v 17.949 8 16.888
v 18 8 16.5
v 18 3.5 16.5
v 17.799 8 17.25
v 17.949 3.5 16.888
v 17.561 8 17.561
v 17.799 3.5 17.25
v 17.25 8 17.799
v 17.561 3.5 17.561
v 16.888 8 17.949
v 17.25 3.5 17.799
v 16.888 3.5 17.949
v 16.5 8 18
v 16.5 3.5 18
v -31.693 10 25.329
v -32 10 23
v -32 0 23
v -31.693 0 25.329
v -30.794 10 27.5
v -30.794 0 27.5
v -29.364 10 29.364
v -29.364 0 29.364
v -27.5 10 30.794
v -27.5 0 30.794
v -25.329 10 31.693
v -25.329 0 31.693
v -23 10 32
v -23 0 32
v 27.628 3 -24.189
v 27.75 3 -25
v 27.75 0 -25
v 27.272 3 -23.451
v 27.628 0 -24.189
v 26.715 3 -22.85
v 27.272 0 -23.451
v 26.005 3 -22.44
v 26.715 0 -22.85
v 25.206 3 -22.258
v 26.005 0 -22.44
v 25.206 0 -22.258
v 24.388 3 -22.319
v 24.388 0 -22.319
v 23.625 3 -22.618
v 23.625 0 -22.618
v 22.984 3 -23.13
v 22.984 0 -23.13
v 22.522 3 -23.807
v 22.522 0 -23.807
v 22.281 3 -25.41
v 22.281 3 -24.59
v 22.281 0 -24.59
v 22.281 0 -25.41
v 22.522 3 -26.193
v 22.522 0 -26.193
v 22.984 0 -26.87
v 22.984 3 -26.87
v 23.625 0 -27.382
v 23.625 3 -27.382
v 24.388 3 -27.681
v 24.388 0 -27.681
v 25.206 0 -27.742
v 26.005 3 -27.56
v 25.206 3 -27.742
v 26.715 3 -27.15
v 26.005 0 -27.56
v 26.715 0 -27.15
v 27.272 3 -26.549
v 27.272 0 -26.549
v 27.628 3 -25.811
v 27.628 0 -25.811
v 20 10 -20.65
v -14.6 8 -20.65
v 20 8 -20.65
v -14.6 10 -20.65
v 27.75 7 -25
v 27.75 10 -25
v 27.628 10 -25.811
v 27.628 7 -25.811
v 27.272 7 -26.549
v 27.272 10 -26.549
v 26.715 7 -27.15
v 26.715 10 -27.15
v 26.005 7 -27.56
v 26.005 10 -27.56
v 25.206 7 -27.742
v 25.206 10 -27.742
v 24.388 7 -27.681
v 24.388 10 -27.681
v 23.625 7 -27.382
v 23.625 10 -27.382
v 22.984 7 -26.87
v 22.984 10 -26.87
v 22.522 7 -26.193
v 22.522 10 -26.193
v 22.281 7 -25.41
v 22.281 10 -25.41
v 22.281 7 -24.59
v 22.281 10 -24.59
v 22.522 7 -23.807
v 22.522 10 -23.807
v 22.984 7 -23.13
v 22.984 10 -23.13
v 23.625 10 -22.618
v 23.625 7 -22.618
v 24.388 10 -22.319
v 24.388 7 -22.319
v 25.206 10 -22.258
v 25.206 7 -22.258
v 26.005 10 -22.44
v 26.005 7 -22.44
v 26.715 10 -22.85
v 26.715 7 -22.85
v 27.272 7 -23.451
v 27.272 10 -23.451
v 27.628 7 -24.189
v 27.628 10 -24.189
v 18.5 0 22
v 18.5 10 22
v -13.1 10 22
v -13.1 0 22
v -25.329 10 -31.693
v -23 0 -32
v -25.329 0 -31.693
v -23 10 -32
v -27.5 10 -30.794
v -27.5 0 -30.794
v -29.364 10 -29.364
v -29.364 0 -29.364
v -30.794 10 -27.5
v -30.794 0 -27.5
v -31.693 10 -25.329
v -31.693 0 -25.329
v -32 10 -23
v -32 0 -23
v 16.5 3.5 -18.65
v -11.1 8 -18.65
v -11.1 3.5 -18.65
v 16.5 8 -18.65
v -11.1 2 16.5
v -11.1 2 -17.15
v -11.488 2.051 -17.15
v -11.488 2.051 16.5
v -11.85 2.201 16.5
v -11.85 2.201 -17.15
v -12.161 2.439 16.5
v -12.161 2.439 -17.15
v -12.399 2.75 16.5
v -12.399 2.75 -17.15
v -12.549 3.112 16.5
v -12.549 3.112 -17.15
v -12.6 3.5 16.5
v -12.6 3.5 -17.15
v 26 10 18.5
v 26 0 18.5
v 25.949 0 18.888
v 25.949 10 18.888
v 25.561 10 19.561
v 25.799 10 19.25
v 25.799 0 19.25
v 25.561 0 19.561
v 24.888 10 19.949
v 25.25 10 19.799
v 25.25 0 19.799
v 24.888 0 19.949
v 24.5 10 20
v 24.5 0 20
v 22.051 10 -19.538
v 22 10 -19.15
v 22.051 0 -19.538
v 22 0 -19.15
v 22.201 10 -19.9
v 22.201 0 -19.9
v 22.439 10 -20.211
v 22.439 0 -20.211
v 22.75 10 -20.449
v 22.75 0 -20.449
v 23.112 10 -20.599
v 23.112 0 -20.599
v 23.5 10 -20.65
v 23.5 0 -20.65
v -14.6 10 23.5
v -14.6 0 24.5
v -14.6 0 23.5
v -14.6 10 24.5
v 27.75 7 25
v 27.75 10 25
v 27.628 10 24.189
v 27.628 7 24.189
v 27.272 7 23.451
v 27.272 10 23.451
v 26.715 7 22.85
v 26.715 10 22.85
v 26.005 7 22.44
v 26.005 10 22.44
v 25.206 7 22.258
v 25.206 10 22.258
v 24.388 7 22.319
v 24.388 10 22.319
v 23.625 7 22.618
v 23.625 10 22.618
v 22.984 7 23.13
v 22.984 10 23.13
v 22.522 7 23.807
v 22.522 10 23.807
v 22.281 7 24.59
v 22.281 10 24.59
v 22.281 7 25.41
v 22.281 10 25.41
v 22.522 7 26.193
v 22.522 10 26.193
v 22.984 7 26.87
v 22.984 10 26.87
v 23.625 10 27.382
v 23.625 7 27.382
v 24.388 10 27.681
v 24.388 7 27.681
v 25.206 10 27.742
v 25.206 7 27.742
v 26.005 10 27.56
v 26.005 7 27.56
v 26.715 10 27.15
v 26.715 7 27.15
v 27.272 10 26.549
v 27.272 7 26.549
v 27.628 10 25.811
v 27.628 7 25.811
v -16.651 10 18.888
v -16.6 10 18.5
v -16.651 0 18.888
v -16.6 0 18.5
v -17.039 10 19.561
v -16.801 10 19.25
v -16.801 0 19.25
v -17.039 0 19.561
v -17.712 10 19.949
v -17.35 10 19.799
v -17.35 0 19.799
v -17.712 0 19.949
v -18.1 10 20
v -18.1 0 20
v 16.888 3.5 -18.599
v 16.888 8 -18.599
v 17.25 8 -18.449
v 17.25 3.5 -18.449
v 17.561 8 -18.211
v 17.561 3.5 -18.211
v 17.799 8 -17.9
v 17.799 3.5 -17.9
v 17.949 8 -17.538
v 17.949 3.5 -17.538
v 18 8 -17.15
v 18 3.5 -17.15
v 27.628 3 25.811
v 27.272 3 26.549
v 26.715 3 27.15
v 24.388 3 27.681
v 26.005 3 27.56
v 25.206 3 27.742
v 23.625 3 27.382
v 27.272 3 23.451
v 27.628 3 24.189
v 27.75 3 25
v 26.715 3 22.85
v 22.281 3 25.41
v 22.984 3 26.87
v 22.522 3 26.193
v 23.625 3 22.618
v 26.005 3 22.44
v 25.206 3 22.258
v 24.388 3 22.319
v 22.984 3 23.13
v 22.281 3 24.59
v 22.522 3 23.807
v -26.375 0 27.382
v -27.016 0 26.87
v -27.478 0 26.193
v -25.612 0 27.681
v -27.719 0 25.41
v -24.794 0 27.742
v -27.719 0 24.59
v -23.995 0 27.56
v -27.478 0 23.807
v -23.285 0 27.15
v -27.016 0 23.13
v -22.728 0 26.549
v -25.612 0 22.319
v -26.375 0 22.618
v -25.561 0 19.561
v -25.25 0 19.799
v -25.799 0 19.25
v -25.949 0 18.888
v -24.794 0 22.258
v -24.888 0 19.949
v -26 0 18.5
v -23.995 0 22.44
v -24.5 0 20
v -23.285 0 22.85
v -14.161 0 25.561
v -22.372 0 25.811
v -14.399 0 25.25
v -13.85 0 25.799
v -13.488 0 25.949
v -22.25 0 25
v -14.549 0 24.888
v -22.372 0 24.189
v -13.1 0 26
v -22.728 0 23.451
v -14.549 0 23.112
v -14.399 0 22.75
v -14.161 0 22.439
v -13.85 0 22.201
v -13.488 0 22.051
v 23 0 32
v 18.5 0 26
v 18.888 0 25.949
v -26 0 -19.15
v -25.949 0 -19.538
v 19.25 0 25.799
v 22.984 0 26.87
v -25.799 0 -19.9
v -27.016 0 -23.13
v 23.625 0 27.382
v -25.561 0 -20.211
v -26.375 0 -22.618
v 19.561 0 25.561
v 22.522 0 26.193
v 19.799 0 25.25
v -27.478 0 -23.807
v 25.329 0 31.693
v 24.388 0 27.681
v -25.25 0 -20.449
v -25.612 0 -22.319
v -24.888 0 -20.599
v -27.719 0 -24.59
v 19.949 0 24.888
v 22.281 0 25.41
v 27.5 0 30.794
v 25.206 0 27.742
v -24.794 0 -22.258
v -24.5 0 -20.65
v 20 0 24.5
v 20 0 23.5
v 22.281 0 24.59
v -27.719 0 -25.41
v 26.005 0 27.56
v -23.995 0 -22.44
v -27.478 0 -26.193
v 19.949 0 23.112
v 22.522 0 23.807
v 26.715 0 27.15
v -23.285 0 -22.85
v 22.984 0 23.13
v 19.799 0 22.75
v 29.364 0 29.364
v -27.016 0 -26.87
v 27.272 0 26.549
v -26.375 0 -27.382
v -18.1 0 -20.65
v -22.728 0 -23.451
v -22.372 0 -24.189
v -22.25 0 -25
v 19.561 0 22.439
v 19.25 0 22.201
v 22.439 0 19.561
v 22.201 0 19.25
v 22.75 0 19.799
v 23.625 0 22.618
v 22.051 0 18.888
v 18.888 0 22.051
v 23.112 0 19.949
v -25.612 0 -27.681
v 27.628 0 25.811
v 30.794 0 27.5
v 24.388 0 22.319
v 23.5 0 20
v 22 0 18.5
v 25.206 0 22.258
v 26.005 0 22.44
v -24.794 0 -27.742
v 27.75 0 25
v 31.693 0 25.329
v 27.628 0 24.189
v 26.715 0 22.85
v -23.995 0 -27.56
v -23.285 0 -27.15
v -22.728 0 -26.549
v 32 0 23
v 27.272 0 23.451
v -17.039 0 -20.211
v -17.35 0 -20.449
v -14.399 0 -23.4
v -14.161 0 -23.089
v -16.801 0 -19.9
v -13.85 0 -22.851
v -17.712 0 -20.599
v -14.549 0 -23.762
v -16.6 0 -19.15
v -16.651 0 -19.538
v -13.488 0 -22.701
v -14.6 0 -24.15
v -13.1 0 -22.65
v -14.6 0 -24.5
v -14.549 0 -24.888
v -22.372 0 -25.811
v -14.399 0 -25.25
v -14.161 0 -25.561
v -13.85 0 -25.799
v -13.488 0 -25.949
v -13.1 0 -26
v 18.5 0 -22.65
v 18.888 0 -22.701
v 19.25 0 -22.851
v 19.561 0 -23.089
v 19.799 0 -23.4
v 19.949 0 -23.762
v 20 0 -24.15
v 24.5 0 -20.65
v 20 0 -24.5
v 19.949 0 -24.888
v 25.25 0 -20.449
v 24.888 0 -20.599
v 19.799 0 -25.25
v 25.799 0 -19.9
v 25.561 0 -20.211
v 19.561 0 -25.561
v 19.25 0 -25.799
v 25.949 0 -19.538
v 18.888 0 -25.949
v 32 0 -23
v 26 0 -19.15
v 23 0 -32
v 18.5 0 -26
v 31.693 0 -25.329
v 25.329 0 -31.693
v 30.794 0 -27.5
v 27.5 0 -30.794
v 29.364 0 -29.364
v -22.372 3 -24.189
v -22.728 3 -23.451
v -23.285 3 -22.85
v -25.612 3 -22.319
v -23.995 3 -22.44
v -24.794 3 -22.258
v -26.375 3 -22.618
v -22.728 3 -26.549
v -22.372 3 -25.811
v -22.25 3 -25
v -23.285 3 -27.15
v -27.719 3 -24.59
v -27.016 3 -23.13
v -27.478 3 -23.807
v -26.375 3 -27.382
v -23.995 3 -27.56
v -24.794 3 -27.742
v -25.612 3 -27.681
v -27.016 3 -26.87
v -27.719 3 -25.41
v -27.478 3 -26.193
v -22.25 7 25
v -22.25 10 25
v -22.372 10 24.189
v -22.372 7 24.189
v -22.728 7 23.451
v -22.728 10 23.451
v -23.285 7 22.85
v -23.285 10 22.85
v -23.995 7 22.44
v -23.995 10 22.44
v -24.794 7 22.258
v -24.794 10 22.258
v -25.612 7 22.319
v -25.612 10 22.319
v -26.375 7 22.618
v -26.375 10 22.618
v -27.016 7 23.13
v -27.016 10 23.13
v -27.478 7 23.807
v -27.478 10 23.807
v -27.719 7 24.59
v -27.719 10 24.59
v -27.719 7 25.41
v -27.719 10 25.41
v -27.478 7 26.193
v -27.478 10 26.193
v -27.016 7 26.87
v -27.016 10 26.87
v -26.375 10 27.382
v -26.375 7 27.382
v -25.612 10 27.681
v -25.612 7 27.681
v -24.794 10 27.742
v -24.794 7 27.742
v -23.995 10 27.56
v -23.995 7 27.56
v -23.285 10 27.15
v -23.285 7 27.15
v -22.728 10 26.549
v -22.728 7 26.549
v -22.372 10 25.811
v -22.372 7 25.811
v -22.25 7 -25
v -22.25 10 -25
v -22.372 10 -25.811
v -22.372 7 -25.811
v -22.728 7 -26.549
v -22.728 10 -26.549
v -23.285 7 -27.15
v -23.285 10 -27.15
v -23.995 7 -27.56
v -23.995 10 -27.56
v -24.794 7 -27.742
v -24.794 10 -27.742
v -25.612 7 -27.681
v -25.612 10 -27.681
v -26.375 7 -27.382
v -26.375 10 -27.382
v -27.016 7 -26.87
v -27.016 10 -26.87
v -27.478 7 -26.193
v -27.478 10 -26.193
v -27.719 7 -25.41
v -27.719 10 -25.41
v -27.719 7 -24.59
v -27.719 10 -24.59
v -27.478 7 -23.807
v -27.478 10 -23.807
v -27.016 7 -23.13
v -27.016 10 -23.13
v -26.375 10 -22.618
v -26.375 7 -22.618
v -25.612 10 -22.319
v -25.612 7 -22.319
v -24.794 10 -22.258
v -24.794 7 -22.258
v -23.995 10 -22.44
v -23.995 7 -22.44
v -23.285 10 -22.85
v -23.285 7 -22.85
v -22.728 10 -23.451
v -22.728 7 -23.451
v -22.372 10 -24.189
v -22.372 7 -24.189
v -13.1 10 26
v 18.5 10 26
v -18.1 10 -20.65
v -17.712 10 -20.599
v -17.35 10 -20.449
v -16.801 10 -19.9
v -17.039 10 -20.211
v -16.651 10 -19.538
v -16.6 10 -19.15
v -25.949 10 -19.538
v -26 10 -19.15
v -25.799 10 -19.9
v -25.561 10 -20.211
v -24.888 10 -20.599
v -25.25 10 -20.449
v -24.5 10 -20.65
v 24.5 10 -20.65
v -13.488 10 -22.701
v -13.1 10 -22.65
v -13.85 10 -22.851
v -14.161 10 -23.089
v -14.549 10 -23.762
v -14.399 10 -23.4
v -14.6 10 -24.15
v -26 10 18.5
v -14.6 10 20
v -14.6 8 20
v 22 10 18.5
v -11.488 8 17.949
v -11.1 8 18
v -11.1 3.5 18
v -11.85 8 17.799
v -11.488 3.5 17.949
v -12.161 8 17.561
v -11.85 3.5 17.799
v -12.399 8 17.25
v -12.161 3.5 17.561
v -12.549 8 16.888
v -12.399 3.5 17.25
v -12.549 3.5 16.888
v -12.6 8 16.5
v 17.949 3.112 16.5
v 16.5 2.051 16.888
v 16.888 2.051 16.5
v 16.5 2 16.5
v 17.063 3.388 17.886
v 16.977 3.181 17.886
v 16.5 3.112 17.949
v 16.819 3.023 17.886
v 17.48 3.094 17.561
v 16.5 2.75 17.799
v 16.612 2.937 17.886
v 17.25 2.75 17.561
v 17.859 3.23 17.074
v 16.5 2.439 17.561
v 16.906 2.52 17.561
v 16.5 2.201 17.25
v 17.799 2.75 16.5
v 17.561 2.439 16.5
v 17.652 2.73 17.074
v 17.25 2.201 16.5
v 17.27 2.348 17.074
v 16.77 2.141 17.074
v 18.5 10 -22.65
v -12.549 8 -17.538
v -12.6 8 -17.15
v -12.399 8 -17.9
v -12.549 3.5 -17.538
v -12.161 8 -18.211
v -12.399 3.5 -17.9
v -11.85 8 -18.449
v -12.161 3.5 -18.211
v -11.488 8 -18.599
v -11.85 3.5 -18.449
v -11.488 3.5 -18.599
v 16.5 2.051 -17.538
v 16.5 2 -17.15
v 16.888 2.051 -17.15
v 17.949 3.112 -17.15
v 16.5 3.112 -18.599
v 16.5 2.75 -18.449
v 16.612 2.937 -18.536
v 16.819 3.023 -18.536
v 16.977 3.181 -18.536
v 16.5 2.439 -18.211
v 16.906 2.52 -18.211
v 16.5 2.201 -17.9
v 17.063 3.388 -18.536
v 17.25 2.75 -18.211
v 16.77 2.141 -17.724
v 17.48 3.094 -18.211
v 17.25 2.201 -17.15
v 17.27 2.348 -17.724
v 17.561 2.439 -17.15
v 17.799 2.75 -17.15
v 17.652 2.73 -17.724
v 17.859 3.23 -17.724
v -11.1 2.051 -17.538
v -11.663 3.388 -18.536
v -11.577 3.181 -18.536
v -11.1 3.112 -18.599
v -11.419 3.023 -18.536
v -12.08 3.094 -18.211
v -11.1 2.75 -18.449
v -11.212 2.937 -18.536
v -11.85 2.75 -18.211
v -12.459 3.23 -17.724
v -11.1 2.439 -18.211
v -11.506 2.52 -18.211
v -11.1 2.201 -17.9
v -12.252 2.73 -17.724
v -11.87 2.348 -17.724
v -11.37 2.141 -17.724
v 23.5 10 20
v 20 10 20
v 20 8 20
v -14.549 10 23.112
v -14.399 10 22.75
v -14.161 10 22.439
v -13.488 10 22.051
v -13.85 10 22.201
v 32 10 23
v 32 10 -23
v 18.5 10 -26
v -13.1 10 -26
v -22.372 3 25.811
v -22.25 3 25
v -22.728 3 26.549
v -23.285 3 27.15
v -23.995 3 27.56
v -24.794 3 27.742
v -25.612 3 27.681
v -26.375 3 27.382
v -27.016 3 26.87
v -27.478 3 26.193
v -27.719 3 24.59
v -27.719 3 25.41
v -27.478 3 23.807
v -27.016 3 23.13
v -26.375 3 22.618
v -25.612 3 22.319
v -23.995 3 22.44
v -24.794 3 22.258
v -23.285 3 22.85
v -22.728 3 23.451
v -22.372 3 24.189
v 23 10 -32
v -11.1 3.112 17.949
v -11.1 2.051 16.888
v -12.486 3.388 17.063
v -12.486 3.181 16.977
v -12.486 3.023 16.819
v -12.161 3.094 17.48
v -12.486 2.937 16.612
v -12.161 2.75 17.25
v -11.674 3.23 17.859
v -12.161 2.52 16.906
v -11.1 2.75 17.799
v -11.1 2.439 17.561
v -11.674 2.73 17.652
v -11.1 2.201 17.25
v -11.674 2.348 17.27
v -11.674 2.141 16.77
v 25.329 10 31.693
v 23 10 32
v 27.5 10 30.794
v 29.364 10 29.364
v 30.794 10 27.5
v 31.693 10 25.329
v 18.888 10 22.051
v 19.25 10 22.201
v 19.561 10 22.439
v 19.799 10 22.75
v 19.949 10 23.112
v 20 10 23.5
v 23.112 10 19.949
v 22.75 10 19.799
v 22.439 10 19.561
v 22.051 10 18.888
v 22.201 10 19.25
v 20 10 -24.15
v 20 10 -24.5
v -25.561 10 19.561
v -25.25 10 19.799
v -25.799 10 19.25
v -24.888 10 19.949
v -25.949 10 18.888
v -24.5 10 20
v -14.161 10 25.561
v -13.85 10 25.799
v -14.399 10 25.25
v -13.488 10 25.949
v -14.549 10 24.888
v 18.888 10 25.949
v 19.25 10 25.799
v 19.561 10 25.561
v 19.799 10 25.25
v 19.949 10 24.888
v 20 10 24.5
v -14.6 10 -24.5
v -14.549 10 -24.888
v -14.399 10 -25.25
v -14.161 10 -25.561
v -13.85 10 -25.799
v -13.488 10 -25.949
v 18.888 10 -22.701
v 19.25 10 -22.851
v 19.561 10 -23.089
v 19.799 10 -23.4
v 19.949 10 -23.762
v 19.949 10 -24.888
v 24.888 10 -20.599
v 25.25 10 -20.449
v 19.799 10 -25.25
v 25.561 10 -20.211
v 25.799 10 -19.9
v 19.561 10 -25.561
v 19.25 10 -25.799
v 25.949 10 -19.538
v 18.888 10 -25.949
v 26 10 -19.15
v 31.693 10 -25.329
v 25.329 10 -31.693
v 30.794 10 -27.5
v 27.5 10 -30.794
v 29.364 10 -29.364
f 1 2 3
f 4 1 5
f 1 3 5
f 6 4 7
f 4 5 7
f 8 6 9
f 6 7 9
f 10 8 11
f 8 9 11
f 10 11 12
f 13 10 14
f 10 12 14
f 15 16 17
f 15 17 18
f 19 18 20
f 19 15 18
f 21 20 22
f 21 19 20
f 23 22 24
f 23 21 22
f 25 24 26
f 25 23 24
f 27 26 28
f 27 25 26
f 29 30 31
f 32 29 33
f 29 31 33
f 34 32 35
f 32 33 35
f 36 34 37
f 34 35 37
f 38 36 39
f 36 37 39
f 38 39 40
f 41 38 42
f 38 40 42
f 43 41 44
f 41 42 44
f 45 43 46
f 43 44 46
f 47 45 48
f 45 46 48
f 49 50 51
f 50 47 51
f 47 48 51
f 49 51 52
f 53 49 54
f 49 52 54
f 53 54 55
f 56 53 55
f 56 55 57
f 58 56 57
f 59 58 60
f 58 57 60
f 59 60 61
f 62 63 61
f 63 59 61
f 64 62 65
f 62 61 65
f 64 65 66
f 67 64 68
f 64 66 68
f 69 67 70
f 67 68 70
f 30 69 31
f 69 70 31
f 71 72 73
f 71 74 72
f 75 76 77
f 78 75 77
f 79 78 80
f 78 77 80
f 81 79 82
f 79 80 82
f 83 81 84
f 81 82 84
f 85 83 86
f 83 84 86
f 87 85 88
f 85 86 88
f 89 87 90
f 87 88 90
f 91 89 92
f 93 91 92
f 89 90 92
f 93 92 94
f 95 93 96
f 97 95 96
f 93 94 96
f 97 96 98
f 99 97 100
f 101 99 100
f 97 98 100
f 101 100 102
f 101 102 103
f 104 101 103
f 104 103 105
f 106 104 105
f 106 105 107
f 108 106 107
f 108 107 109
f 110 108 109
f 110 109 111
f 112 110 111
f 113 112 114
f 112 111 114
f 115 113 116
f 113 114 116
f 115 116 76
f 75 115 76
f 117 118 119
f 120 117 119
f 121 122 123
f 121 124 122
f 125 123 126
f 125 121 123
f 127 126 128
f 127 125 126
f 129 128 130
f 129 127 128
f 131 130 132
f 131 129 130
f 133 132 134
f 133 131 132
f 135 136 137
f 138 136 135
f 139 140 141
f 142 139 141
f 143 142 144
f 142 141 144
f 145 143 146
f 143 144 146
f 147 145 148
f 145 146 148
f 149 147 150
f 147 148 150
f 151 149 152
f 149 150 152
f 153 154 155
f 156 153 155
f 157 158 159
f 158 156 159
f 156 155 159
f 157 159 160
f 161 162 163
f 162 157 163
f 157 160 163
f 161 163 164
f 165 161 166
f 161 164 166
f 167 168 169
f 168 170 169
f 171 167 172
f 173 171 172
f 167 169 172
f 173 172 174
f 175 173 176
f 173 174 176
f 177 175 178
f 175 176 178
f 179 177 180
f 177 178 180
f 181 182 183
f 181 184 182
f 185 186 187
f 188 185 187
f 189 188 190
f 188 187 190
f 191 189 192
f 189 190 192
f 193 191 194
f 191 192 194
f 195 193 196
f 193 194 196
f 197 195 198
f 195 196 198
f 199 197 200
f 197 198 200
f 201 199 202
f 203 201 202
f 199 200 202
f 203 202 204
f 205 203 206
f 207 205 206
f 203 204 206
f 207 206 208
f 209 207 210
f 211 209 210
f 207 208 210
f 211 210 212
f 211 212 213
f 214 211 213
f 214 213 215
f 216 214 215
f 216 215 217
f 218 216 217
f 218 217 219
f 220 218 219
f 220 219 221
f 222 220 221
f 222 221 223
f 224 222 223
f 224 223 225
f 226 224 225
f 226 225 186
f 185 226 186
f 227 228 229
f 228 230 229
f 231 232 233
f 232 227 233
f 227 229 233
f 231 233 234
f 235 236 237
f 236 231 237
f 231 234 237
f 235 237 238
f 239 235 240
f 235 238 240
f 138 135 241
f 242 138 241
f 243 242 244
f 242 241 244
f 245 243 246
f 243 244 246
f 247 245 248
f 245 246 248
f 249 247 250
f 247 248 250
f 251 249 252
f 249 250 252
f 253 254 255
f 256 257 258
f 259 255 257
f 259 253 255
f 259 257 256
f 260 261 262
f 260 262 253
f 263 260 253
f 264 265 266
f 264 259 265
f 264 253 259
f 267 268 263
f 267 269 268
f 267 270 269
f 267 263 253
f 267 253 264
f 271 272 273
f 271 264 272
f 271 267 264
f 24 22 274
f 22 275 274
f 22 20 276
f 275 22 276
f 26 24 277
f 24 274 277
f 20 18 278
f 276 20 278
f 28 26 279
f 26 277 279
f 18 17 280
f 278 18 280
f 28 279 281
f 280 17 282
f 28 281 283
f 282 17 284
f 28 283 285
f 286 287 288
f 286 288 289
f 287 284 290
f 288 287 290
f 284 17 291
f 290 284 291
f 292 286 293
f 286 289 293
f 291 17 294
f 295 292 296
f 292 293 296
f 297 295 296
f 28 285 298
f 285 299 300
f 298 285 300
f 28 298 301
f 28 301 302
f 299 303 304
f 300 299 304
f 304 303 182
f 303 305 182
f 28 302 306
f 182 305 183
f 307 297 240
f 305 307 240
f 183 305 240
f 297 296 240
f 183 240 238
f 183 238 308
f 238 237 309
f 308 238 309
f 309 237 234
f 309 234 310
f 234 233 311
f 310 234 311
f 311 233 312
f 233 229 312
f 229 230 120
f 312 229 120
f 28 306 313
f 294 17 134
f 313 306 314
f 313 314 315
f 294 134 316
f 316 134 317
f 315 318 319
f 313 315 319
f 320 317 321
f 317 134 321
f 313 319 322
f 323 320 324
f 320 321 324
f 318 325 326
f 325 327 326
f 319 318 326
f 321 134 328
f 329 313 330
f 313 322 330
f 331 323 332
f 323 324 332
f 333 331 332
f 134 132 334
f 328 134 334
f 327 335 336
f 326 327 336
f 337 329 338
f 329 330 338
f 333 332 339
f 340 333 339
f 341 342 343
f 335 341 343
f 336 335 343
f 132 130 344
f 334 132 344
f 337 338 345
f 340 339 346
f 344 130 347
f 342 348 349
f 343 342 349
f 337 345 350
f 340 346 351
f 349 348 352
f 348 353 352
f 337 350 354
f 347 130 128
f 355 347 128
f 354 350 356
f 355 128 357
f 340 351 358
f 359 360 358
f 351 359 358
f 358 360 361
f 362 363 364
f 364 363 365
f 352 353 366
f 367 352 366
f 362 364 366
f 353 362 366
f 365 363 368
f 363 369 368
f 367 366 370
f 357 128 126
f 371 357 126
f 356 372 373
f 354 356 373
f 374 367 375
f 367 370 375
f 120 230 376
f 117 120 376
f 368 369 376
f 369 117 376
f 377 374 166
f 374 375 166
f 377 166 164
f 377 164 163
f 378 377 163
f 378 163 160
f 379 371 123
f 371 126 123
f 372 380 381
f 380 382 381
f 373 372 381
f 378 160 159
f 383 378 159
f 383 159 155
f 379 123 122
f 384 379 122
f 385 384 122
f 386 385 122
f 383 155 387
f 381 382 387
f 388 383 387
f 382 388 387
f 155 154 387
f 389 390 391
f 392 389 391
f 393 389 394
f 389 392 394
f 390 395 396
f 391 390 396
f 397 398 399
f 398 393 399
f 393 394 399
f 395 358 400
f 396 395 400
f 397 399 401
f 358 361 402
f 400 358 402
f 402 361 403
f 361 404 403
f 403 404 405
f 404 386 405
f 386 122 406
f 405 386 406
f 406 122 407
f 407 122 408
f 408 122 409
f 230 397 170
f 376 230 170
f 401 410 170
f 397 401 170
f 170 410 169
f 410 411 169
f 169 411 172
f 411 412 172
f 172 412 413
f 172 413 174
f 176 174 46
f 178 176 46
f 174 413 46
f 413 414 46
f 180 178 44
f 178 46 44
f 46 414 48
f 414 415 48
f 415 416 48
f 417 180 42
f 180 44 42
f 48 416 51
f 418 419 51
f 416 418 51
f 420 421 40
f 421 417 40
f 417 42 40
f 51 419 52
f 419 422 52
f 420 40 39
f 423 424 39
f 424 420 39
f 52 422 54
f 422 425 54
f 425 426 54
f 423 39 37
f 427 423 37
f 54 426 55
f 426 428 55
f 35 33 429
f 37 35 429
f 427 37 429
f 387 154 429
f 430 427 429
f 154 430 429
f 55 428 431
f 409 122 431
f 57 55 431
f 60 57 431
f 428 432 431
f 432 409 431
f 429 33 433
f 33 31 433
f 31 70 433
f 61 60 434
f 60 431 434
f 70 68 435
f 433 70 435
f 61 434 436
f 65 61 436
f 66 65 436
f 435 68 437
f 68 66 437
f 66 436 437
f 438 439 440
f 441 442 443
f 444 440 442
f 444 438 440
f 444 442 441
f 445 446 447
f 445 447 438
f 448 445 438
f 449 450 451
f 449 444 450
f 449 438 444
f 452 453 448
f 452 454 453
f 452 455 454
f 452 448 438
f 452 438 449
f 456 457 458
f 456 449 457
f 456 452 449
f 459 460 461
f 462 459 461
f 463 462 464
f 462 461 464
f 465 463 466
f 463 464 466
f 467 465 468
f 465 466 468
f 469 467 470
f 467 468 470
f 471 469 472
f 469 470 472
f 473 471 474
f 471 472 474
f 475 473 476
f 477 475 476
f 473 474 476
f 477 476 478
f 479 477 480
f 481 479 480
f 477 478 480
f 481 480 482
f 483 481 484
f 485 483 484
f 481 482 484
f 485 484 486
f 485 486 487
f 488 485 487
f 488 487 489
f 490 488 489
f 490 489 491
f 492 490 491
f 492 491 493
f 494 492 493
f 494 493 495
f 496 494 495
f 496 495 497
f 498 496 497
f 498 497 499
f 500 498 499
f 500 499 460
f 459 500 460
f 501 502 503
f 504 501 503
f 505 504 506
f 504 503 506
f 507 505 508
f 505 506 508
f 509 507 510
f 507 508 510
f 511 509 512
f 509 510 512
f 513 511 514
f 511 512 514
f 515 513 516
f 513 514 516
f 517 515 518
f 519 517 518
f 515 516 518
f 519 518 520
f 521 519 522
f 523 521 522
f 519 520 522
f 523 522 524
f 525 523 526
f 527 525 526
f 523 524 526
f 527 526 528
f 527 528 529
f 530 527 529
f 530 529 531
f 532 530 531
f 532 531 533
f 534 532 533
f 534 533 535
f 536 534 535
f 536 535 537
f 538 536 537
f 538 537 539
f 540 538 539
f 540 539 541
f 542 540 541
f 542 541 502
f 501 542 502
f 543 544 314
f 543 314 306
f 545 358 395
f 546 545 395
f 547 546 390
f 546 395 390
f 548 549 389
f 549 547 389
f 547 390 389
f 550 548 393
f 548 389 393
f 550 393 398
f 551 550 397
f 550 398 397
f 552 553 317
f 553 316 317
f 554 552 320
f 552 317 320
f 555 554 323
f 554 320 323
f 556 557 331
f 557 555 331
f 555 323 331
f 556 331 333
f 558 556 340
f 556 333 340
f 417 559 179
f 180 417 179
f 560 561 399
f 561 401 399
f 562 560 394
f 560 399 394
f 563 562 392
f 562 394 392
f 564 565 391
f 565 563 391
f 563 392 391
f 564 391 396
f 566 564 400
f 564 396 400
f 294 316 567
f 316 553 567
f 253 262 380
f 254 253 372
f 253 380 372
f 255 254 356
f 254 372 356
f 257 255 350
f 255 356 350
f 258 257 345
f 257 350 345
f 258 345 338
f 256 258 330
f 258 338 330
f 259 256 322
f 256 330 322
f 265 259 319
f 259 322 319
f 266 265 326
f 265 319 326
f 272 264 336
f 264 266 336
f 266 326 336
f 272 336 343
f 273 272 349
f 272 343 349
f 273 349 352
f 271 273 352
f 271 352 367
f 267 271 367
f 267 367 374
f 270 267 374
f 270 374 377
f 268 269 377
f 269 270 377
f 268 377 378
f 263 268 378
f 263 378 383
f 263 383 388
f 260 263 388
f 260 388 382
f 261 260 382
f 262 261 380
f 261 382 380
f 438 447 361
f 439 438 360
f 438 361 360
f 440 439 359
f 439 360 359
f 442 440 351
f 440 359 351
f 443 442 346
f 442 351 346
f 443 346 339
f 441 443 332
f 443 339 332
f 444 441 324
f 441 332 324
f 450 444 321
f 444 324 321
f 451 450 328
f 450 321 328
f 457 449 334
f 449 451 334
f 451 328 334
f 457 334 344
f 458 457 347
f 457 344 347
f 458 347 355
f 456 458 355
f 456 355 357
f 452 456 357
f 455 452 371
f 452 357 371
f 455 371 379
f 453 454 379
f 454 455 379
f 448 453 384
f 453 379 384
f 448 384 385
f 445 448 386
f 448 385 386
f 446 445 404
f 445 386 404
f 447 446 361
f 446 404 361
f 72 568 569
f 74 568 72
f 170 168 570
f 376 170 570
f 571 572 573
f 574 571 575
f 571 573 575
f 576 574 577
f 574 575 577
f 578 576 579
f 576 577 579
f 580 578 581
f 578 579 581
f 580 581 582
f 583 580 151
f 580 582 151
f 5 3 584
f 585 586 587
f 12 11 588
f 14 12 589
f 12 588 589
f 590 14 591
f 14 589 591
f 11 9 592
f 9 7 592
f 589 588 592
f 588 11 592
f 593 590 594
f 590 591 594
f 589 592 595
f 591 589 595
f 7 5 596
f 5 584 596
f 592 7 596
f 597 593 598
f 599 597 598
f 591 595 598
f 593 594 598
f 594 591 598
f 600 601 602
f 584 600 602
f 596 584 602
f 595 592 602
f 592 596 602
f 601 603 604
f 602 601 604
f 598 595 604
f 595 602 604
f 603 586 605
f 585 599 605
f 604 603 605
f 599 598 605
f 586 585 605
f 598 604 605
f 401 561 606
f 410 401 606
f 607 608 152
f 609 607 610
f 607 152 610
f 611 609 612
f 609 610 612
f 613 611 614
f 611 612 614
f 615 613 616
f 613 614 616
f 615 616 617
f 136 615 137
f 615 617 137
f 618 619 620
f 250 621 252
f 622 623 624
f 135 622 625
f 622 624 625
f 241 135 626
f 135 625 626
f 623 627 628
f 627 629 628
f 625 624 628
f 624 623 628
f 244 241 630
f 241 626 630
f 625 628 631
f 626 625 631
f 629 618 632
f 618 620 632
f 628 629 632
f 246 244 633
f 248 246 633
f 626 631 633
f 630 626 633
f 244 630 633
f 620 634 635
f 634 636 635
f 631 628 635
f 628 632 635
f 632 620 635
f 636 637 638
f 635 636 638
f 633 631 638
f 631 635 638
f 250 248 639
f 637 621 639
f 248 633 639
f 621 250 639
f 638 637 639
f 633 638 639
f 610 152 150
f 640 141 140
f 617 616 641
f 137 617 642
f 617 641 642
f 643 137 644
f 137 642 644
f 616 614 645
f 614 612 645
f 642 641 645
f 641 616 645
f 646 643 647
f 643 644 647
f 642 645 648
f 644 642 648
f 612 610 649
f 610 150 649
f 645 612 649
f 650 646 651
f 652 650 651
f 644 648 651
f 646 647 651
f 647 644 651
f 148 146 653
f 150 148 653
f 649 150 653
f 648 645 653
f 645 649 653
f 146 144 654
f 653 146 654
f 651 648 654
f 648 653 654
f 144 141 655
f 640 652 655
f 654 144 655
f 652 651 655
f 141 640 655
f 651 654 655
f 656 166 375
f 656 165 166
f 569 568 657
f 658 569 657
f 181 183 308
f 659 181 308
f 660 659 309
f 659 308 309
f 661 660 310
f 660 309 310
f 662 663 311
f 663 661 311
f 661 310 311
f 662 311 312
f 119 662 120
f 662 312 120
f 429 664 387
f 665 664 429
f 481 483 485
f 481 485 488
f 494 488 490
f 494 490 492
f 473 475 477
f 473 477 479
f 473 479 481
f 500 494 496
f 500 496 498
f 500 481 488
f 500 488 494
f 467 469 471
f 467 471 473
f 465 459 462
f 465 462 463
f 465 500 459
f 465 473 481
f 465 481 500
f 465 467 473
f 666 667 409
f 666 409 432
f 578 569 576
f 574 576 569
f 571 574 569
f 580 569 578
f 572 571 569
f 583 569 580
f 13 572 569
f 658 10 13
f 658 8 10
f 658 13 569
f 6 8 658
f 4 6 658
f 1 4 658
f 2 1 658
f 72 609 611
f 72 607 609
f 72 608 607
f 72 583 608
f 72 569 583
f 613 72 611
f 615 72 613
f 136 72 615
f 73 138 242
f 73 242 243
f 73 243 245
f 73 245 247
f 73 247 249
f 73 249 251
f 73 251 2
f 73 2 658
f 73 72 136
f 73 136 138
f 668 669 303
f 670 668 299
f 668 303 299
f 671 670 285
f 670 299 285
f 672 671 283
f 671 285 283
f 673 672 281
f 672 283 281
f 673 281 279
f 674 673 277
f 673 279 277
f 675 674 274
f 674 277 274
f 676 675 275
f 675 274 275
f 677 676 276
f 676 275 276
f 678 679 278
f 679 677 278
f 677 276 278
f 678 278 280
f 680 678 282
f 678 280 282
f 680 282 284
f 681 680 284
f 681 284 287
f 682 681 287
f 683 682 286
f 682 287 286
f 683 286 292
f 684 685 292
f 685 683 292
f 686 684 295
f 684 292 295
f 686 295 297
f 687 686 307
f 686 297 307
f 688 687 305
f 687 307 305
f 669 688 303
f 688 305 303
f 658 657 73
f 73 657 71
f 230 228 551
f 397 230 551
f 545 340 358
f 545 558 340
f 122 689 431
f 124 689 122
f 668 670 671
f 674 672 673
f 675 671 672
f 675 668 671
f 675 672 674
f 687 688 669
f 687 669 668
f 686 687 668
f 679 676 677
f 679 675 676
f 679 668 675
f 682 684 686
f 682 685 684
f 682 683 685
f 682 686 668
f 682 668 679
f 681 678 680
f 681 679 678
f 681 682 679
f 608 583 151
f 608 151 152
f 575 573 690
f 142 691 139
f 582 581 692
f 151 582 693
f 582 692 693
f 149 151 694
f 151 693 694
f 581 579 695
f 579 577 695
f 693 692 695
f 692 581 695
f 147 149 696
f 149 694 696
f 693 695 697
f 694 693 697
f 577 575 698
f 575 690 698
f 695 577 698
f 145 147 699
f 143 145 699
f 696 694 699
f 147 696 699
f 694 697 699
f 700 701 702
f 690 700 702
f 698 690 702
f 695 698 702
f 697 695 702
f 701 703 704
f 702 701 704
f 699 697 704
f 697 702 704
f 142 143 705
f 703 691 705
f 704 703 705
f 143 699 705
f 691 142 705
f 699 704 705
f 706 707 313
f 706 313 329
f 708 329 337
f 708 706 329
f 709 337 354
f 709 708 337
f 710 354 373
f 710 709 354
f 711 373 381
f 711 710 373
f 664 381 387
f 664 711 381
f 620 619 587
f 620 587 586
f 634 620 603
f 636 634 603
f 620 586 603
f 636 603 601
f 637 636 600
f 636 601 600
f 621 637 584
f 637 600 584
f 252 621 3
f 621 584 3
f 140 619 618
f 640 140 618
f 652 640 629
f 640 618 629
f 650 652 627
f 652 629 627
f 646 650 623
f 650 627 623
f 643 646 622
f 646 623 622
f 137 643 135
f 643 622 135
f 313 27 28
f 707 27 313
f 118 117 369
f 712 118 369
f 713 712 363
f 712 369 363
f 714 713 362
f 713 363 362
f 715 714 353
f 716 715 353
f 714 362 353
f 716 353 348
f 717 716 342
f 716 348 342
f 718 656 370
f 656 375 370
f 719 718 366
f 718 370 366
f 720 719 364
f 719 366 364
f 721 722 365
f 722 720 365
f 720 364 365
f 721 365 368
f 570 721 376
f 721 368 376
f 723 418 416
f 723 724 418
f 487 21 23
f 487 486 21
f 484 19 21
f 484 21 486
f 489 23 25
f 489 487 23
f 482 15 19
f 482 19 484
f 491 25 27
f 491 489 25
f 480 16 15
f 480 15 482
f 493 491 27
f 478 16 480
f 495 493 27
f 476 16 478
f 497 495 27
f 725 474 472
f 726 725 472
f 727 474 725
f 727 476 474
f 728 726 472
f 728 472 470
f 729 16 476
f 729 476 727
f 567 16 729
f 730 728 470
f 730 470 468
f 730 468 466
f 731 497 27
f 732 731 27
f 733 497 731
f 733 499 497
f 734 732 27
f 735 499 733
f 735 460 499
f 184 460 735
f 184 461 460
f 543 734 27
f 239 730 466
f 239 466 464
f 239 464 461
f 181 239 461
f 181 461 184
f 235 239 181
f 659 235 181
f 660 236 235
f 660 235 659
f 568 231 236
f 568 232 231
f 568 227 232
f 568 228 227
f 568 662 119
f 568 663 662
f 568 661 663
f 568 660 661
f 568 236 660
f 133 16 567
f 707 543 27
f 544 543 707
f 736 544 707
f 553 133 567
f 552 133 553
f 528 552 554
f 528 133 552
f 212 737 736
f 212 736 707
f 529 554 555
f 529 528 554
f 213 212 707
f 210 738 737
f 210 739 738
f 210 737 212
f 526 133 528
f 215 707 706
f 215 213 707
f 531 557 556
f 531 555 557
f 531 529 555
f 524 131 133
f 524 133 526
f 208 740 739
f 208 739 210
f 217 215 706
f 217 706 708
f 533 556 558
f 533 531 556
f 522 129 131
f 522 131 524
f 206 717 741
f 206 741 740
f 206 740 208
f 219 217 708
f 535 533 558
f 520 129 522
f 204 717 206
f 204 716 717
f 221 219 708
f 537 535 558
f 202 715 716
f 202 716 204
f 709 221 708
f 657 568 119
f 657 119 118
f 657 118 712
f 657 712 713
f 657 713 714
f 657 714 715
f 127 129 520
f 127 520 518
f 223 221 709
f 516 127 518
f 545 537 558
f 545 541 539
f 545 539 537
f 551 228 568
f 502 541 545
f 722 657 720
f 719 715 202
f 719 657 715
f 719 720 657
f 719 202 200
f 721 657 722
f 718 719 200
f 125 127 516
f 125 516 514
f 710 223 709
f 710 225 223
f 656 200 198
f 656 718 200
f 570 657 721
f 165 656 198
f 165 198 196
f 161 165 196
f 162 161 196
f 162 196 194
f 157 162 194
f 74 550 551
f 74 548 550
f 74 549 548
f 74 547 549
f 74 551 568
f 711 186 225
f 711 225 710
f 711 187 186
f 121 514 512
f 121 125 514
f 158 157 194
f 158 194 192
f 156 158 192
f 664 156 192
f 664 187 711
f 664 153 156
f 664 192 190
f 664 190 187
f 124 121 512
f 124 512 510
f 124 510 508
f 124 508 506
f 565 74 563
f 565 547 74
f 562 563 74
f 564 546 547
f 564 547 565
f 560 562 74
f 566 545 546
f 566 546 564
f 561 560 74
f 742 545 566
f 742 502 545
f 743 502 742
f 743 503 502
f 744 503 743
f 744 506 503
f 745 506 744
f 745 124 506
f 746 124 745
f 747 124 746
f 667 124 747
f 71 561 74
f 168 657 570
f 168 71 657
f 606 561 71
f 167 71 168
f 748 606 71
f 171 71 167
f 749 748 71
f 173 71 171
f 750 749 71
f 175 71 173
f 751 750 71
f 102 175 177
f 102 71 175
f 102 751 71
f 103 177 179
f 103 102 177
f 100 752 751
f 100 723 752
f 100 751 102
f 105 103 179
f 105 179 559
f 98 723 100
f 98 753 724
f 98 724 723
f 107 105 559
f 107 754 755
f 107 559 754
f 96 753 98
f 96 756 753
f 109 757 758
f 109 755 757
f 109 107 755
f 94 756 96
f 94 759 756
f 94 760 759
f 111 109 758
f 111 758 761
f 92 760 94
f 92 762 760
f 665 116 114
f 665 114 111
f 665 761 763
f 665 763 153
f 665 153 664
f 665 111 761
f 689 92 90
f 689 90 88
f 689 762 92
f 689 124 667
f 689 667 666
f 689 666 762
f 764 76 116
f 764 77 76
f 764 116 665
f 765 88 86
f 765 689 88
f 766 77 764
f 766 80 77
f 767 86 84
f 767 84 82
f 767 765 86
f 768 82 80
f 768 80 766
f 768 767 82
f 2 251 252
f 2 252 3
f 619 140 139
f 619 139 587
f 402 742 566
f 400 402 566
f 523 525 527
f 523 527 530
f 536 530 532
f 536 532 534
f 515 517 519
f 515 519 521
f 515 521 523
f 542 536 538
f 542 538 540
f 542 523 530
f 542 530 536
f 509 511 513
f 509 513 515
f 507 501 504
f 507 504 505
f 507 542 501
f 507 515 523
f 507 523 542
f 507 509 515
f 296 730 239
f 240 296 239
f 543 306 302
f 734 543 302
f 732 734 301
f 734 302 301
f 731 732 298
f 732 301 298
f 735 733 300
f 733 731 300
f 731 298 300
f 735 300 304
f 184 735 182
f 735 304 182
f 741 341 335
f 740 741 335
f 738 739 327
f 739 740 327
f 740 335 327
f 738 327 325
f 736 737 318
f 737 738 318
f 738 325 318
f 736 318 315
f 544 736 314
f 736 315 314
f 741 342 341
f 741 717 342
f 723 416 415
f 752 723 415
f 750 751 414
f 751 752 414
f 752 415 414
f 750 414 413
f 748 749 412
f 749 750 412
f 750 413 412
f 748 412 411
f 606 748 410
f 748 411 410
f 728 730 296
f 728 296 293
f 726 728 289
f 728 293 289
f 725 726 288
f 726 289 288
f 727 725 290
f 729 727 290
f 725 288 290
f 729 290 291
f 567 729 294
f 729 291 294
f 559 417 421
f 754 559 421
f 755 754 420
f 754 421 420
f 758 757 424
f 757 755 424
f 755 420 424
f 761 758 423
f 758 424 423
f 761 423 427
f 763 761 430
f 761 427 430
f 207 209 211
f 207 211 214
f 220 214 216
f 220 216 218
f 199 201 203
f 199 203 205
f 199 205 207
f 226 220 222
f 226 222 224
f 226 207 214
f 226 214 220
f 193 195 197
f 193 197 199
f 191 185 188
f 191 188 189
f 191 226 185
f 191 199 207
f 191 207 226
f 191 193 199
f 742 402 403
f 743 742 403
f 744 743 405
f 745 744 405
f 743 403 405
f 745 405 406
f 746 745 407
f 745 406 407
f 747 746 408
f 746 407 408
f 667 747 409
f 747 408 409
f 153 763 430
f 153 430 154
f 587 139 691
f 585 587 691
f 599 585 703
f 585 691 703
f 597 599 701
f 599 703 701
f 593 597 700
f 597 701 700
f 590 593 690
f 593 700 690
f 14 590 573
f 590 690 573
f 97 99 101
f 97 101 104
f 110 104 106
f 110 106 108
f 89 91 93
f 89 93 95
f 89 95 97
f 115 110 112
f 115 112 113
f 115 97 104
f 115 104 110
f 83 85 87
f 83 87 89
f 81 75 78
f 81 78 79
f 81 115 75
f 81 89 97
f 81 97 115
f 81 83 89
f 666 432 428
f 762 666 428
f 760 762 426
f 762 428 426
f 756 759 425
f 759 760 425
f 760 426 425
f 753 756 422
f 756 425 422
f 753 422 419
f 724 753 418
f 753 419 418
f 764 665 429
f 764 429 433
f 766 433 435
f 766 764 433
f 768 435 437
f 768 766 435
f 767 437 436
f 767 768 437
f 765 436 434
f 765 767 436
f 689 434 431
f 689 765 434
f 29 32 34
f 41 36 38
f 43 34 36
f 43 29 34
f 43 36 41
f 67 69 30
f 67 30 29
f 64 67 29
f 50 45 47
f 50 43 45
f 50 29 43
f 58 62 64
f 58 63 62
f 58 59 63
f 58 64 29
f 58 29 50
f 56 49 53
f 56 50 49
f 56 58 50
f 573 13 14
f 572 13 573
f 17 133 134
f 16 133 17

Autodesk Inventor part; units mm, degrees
ref_plane "YZ Plane" through (0, 0, 0) normal (1, 0, 0) x (0, 1, 0)
ref_plane "XZ Plane" through (0, 0, 0) normal (0, 1, 0) x (-1, 0, 0)
sketch "Sketch1" plane through (0, 0, 0) normal (0, 1, 0) x (-1, 0, 0)
  line L0 (30, 30) -> (-30, 30)
  line L1 (-30, 30) -> (-30, -30)
  line L2 (-30, -30) -> (30, -30)
  line L3 (30, -30) -> (30, 30)
  line L4 (30, 30) -> (-30, -30) construction
  line L5 (-30, 30) -> (30, -30) construction
  point P0 (0, 0)
  dimension "d0" = 60
  dimension "d1" = 60
extrude "Extrusion1" add sketch "Sketch1" along normal blind 10
fillet "Fillet1" radius 7 4 edges at (30, 5, 30) (30, 5, -30) (-30, 5, 30) (-30, 5, -30)
sketch "Sketch2" plane through (0, 10, 0) normal (0, 1, 0) x (1, 0, 0)
  line L0 (-30, 30) -> (30, 30)
  line L1 (30, 30) -> (30, -30)
  line L2 (30, -30) -> (-30, -30)
  line L3 (-30, -30) -> (-30, 30)
  line L4 (-30, 30) -> (30, -30) construction
  line L5 (30, 30) -> (-30, -30) construction
  line L6 (25, -25) -> (25, 25)
  line L7 (25, 25) -> (-25, 25)
  line L8 (-25, 25) -> (-25, -25)
  line L9 (-25, -25) -> (25, -25)
  circle A0 centre (25, -25) radius 2.75
  circle A1 centre (-25, -25) radius 2.75
  circle A2 centre (25, 25) radius 2.75
  circle A3 centre (-25, 25) radius 2.75
  point P0 (0, 0)
  dimension "d5" = 5
  dimension "d6" = 5.5
  dimension "d7" = 5.5
  dimension "d8" = 5.5
  dimension "d9" = 5.5
extrude "Extrusion2" cut sketch "Sketch2" against normal blind 3 contours L9 A0 L6 | L6 A0 L9 | A2 L7 L6 | L6 L7 A2 | A1 L8 L9 | L9 L8 A1 | A3 L8 L7 | L7 L8 A3
sketch "Sketch3" plane through (0, 10, 0) normal (0, 1, 0) x (1, 0, 0)
  line L0 (-30, 30) -> (30, 30)
  line L1 (30, 30) -> (30, -30)
  line L2 (30, -30) -> (-30, -30)
  line L3 (-30, -30) -> (-30, 30)
  line L4 (-30, 30) -> (30, -30) construction
  line L5 (30, 30) -> (-30, -30) construction
  line L6 (20, -20) -> (20, 20.65)
  line L7 (-20, -20) -> (20, -20)
  line L8 (18, 18.65) -> (18, -18)
  line L9 (-20, 20.65) -> (20.65, 20.65)
  line L10 (18, 18.65) -> (18.65, 18.65)
  line L11 (-12.6, -18) -> (-12.6, 18.65)
  line L12 (-14.6, -20) -> (-14.6, 20.65)
  line L13 (18, 18.65) -> (-12.6, 18.65)
  line L14 (18, -18) -> (-12.6, -18)
  line L15 (-26, 20.65) -> (-20, 20.65)
  line L16 (-26, 20.65) -> (-26, -20)
  line L17 (-26, -20) -> (-20, -20)
  point P0 (0, 0)
  point P1 (-12.6, -20)
  dimension "d12" = 60
  dimension "d13" = 60
  dimension "d14" = 10
  dimension "d16" = 34.6
  dimension "d17" = 2
  dimension "d18" = 40.65
  dimension "d22" = 4
  dimension "d23" = 4
extrude "Extrusion3" cut sketch "Sketch3" against normal blind 2 contours L7 L12 L9 L6
sketch "Sketch4" plane through (0, 10, 0) normal (0, 1, 0) x (1, 0, 0)
  line L0 (-12.6, 18.65) -> (18, 18.65)
  line L1 (18, 18.65) -> (18, -18)
  line L2 (18, -18) -> (-12.6, -18)
  line L3 (-12.6, -18) -> (-12.6, 18.65)
  point P0 (0, 0)
extrude "Extrusion4" cut sketch "Sketch4" against normal blind 8
sketch "Sketch5" plane through (0, 10, 0) normal (0, 1, 0) x (1, 0, 0)
  line L0 (20, -20) -> (-14.6, -20)
  line L1 (-14.6, -20) -> (-14.6, 20.65)
  line L2 (-30, 23) -> (-30, -23) projected
  line L3 (-23, -30) -> (23, -30) projected
  line L4 (30, -23) -> (30, 23) projected
  line L5 (-26, 20.65) -> (-14.6, 20.65)
  line L6 (-26, -20) -> (-14.6, -20)
  line L7 (-26, 20.65) -> (-26, -20)
  line L8 (-14.6, -26) -> (-14.6, -20)
  line L9 (-14.6, -20) -> (-14.6, -26)
  line L10 (20, -26) -> (-14.6, -26)
  line L11 (20, -20) -> (20, -26)
  line L12 (26, -20) -> (20, -20)
  line L13 (26, 20.65) -> (20, 20.65)
  line L14 (30, -23) -> (30, 23) projected
  line L15 (26, 20.65) -> (26, -20)
  line L16 (23, 30) -> (-23, 30) projected
  line L17 (-14.6, 26) -> (-14.6, 20.65)
  line L18 (-14.6, 26) -> (20, 26)
  line L19 (20, 26) -> (20, 20.65)
  line L20 (-16.6, -20) -> (-16.6, 20.65)
  line L21 (20, -22) -> (-14.6, -22)
  line L22 (22, 20.65) -> (22, -20)
  line L23 (-14.6, 22.65) -> (18.1816, 22.65)
  line L24 (18.1816, 22.65) -> (20, 22.65)
  point P0 (0, 0)
  dimension "d28" = 4
  dimension "d29" = 4
  dimension "d30" = 4
  dimension "d31" = 4
  dimension "d32" = 4
  dimension "d33" = 4
  dimension "d36" = 4
  dimension "d37" = 4
  dimension "d38" = 2
  dimension "d39" = 2
extrude "Extrusion5" cut sketch "Sketch5" against normal through all contours L11 L10 L8 L21 | L22 L13 L15 L12 | L6 L7 L5 L20 | L17 L18 L19 L24 L23
fillet "Fillet2" radius 1.5 24 edges at (-16.6, 5, -20.65) (20, 5, -26) (26, 5, -20.65) (20, 5, 22) (-14.6, 5, -26) (-26, 5, -20.65) (22, 5, -20.65) (-14.6, 5, 22) (-26, 5, 20) (-14.6, 5, -22.65) (-14.6, 5, 26) (-16.6, 5, 20) (20, 5, 26) (26, 5, 20) (18, 2, -0.325) (2.7, 2, 18) (-12.6, 2, -0.325) (2.7, 2, -18.65) (-12.6, 5, -18.65) (18, 5, -18.65) (18, 5, 18) (-12.6, 5, 18) (22, 5, 20) (20, 5, -22.65)
sketch "Sketch6" plane through (-12.6, 3.5, 16.5) normal (1, 0, 0) x (0, 0, -1)
  point P0 (16.5, -3.5)
ref_plane "Work Plane1" through (0, 5, 0) normal (0, 1, 0) x (1, 0, 0)
mirror "Mirror1" about plane through (0, 5, 0) normal (0, 1, 0) of "Extrusion2"
sketch "Sketch7" plane through (0, 10, 0) normal (0, 1, 0) x (1, 0, 0)
  line L0 (-23, 30) -> (23, 30)
  line L1 (30, 23) -> (30, -23)
  line L2 (23, -30) -> (-23, -30)
  line L3 (-30, -23) -> (-30, 23)
  line L4 (-30, 30) -> (30, -30) construction
  line L5 (30, 30) -> (-30, -30) construction
  arc A0 (30, 23) -> (23, 30) centre (23, 23) ccw
  arc A1 (-23, 30) -> (-30, 23) centre (-23, 23) ccw
  arc A2 (-30, -23) -> (-23, -30) centre (-23, -23) ccw
  arc A3 (23, -30) -> (30, -23) centre (23, -23) ccw
  line L6 (32, -23) -> (32, 23)
  arc A4 (32, 23) -> (23, 32) centre (23, 23) ccw
  line L7 (23, 32) -> (-23, 32)
  arc A5 (-23, 32) -> (-32, 23) centre (-23, 23) ccw
  line L8 (-32, 23) -> (-32, -23)
  arc A6 (-32, -23) -> (-23, -32) centre (-23, -23) ccw
  line L9 (-23, -32) -> (23, -32)
  arc A7 (23, -32) -> (32, -23) centre (23, -23) ccw
  point P0 (0, 0)
  dimension "d45" = 60
  dimension "d46" = 60
  dimension "d47" = 7
  dimension "d48" = 2
extrude "Extrusion6" add sketch "Sketch7" against normal blind 10
properties part number "new IC holder"
